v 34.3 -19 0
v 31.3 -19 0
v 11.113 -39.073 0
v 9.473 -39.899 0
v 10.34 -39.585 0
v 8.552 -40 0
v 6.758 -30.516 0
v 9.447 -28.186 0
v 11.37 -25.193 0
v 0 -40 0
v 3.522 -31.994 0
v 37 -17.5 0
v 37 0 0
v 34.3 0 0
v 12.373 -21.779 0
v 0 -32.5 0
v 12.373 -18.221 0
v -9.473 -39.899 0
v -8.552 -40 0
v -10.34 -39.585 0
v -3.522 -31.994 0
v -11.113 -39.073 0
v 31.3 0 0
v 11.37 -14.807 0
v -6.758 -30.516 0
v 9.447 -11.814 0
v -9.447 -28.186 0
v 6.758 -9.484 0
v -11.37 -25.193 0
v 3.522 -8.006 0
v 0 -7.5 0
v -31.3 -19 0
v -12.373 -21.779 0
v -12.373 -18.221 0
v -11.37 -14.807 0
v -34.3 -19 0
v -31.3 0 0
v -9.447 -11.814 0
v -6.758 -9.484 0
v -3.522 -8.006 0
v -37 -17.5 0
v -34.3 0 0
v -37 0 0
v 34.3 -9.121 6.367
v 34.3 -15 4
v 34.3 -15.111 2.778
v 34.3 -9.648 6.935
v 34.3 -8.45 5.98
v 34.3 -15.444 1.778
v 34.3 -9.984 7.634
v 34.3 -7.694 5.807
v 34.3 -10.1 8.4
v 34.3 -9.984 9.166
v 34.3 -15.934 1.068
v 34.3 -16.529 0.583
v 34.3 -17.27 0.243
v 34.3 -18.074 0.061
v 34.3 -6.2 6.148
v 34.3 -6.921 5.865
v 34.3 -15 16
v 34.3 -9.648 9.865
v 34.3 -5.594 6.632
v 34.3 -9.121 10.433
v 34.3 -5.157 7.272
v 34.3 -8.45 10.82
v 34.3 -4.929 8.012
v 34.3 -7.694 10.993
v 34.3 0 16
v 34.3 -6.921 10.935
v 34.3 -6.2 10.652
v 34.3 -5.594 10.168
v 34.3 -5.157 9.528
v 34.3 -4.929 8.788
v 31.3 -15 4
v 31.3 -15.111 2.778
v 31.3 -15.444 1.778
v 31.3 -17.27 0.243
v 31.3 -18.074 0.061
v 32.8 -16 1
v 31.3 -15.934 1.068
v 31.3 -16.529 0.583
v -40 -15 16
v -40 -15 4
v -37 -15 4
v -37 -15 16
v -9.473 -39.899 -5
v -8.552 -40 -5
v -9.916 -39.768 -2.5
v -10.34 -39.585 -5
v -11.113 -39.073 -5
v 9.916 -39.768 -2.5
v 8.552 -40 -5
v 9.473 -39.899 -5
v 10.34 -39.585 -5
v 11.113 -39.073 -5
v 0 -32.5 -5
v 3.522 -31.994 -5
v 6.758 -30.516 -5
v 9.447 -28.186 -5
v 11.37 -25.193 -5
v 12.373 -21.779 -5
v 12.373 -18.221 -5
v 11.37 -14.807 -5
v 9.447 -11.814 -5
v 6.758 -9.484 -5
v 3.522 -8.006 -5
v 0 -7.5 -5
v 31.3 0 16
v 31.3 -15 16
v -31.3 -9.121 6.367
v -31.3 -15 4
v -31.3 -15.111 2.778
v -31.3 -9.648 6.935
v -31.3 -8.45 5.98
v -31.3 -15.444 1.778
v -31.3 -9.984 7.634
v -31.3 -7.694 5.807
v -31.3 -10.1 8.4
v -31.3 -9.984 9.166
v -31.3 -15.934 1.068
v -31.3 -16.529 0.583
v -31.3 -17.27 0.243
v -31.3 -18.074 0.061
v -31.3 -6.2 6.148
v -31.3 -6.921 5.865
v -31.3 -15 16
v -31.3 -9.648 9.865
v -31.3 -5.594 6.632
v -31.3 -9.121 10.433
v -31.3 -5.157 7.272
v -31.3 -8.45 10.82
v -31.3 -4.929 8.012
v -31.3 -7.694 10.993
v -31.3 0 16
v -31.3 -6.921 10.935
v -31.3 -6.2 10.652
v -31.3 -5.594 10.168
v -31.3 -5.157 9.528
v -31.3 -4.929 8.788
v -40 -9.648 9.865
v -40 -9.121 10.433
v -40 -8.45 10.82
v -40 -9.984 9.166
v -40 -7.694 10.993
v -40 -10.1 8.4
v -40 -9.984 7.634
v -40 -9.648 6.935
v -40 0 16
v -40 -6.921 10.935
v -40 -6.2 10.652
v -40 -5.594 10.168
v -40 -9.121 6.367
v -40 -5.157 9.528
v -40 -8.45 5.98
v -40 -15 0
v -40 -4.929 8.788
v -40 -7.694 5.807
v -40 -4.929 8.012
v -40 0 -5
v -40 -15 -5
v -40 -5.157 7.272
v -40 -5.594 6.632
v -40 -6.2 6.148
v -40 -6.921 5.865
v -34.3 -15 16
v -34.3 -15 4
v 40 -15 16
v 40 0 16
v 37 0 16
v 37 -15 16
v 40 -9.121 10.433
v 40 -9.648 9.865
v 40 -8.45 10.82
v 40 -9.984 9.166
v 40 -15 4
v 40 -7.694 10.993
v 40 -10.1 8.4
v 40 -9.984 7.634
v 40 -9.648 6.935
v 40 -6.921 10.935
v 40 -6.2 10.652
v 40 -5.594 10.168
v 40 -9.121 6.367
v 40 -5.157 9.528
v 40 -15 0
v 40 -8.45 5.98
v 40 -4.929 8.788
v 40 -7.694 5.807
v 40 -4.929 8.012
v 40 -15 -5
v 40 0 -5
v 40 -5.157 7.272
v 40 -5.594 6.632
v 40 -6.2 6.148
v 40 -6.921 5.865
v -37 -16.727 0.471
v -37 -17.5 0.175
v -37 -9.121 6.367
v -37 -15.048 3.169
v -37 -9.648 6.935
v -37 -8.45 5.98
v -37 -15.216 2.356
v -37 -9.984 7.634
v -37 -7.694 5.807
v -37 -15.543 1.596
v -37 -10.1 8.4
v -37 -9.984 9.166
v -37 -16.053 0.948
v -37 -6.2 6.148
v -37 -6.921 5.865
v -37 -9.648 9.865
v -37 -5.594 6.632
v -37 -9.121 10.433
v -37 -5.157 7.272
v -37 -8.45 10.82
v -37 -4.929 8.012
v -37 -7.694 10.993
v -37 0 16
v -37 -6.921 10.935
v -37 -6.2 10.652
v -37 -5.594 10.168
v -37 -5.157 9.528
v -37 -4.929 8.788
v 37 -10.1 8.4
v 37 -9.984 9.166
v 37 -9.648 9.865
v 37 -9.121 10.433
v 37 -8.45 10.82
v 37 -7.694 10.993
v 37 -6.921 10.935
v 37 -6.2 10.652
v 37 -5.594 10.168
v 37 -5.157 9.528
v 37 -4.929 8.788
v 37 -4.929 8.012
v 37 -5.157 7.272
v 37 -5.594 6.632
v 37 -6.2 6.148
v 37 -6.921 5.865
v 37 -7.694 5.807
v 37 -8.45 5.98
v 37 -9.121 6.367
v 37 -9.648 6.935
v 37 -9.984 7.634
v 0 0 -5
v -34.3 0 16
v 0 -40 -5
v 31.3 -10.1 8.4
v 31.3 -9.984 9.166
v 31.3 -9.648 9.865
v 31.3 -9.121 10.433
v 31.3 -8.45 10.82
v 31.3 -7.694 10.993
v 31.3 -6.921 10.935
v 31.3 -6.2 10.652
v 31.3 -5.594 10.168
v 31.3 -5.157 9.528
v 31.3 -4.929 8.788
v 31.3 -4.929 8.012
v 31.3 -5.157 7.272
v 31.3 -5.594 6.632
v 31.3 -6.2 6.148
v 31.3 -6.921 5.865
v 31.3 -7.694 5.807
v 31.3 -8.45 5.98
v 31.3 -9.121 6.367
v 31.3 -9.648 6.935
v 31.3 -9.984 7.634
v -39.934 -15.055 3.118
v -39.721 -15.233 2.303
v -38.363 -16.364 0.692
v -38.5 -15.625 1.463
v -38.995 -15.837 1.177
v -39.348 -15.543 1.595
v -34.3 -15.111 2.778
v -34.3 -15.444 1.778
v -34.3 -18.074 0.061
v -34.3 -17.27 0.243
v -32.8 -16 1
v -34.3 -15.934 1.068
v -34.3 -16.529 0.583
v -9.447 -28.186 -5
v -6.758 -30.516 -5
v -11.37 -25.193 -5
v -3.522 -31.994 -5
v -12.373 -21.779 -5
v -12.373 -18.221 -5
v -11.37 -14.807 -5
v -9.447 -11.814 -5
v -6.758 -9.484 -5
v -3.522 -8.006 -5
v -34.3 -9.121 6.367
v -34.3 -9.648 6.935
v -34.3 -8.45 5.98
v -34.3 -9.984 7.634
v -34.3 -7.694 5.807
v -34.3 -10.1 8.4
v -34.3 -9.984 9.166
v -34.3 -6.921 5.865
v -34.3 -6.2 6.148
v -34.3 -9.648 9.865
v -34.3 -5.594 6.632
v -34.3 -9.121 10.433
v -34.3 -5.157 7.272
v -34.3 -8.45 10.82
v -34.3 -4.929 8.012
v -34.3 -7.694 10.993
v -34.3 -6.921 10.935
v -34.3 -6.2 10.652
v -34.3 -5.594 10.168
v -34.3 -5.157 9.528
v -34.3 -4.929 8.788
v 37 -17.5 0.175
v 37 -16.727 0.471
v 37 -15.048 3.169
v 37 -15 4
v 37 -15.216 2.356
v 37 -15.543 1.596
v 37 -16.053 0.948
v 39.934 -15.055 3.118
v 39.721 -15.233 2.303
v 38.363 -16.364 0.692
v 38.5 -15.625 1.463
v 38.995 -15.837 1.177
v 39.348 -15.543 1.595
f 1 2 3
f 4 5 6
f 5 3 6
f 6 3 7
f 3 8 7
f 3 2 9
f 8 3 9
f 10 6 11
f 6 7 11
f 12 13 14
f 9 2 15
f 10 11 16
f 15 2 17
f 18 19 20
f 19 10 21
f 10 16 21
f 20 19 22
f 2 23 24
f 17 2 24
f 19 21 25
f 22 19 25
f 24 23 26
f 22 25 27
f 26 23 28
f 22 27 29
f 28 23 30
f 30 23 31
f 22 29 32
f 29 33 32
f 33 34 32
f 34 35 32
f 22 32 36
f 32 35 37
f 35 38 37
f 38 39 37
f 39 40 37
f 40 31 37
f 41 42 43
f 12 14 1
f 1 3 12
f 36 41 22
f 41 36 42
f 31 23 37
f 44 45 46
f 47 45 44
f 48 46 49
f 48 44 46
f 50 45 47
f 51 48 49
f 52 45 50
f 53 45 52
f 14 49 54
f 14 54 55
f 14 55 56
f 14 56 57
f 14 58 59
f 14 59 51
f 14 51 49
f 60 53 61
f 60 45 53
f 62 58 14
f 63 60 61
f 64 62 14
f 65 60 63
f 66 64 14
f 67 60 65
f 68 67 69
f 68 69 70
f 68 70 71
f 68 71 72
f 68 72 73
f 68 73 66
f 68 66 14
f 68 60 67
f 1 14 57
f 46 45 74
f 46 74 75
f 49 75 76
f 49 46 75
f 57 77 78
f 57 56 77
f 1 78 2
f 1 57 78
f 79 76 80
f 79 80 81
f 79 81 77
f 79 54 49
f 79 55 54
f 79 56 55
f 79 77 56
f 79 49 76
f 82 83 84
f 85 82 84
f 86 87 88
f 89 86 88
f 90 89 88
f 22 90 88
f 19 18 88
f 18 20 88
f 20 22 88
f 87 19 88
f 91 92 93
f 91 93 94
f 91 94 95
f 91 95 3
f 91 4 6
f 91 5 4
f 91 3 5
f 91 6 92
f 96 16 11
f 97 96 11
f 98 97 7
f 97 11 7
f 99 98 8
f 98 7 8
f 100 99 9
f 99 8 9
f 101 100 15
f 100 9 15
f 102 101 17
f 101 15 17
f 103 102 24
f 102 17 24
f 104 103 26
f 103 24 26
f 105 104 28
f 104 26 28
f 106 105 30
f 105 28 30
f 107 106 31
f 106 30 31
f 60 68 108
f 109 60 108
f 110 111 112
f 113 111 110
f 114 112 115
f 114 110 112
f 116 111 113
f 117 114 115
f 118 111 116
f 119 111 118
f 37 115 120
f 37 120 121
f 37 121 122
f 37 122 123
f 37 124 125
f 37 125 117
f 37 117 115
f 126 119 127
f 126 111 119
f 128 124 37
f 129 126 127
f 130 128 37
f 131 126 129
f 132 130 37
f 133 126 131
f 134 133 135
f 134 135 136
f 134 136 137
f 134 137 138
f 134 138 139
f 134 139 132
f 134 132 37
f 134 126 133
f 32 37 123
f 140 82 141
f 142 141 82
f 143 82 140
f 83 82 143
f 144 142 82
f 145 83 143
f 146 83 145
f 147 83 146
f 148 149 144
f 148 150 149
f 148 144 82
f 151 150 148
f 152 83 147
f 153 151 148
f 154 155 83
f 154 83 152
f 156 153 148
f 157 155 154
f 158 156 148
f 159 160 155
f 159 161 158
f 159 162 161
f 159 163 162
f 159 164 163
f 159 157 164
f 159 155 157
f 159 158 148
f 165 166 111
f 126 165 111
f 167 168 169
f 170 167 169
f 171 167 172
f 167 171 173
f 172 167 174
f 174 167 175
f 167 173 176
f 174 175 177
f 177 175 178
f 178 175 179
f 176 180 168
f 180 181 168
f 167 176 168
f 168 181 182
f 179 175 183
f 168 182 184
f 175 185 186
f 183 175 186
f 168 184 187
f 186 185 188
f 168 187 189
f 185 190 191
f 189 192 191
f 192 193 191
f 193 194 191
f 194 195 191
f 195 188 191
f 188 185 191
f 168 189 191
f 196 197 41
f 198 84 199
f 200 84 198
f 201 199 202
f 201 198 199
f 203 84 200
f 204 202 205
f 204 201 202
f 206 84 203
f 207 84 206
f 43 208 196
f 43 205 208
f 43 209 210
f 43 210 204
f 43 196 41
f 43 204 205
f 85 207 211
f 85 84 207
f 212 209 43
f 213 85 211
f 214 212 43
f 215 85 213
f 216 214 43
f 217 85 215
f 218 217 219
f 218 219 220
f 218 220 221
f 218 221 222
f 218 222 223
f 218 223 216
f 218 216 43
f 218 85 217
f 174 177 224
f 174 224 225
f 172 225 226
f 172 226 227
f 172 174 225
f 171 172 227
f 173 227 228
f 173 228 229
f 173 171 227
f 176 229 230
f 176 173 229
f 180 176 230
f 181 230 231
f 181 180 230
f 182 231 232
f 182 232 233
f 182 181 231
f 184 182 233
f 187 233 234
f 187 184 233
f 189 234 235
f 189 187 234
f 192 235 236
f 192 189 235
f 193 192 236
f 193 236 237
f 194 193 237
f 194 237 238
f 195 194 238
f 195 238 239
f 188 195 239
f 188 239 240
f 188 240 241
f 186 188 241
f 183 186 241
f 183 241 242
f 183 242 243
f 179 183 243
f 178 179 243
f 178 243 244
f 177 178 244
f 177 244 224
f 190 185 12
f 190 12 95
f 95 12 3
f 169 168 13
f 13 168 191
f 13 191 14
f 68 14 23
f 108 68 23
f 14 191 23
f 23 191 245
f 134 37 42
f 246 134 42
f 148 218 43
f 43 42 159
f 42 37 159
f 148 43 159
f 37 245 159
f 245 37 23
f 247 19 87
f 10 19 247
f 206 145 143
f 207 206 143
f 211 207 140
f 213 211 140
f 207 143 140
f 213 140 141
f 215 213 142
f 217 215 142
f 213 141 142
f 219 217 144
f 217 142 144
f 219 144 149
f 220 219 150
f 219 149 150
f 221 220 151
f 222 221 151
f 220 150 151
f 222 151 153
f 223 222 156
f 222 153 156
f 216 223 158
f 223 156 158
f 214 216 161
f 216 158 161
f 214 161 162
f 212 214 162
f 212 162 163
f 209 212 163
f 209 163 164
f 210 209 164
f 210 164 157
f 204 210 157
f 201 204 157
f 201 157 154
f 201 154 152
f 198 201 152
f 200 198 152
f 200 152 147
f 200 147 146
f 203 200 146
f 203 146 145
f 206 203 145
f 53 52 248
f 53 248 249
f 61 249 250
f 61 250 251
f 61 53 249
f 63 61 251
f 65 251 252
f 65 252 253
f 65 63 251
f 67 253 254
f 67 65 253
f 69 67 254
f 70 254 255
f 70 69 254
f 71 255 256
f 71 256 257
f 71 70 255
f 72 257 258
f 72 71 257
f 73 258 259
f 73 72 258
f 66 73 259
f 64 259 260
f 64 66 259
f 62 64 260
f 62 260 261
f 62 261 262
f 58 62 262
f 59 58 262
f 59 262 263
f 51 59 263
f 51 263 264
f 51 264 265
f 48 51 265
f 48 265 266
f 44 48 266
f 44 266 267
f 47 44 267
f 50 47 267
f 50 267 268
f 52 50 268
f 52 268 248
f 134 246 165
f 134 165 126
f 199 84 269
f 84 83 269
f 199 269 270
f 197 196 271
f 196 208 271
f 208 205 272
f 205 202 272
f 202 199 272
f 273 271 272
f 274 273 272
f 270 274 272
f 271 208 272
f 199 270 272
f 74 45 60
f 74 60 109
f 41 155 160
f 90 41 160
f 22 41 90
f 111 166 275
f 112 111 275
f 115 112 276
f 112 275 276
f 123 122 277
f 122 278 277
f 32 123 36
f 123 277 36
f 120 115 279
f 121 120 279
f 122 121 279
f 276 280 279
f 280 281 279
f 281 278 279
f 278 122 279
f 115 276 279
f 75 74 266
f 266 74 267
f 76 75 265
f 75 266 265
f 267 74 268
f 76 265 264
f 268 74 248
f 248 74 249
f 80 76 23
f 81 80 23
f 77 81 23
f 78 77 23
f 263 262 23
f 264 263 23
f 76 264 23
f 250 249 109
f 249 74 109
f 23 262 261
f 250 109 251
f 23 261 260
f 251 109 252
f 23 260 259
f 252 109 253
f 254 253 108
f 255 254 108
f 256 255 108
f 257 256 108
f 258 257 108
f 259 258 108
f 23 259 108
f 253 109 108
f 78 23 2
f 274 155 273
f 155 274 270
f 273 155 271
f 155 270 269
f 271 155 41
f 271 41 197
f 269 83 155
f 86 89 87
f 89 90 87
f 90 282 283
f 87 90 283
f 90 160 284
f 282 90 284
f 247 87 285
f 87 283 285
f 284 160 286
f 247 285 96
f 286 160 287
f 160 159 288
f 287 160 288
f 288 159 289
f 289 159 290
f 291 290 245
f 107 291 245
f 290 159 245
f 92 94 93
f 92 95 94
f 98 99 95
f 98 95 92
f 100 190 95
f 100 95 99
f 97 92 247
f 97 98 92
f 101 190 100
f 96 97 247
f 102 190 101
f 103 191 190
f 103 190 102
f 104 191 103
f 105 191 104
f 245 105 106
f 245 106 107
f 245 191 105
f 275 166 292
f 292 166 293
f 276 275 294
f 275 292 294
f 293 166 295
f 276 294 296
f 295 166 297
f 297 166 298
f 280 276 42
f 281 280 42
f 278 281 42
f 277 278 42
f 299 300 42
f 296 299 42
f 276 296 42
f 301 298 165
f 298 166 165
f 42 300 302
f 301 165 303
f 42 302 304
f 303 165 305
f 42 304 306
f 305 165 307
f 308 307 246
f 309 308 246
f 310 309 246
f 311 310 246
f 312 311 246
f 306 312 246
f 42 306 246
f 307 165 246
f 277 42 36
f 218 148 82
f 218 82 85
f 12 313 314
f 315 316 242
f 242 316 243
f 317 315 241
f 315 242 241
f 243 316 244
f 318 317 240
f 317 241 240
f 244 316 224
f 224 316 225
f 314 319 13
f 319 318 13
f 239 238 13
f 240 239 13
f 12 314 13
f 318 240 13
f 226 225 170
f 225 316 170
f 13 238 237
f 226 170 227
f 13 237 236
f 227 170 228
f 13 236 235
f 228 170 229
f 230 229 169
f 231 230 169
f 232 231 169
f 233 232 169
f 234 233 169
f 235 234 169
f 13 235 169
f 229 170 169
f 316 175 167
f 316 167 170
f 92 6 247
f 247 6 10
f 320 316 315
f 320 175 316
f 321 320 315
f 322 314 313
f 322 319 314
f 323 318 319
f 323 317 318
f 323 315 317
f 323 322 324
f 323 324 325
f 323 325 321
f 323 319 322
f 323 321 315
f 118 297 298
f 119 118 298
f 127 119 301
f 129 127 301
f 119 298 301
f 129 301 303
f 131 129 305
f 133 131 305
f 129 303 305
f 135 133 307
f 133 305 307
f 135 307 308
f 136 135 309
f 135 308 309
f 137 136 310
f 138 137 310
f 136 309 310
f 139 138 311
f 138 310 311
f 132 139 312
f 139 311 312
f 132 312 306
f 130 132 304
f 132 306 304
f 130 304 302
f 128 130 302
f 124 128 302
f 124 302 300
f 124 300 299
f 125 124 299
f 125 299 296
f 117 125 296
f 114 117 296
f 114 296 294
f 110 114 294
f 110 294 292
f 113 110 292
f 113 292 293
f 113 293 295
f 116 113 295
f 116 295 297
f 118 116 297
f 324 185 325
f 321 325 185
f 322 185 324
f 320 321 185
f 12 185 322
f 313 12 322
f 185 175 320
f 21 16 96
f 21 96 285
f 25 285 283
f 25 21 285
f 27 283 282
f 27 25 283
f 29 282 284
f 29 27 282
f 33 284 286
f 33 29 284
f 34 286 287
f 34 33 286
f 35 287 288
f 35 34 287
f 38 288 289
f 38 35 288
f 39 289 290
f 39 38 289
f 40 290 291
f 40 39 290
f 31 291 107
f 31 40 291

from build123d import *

# Parameters (mm, degrees)
F0_W         = 3
F0_H         = 15
F1_DEPTH     = 5
F2_DEPTH     = 16
F3_T1_DEPTH  = 3
F3_T6_DEPTH  = 23
F3_T12_DEPTH = 13
F3_T17_DEPTH = 23
F3_T20_DEPTH = 12.2409987036
F4_R         = 2.6
F5_DEPTH     = 40.0010001


# Not quite as in the source:
# - a fillet or chamfer that OpenCascade refuses, or shapes differently, is made with other operations: its cross-section is extruded or revolved along the edge and cut away or added


with BuildPart() as f1:
    # F0 (on Top) → F1 (new body)
    with BuildSketch(Plane.XY):
        with BuildLine():
            Line((-34.3, 0), (-37, 0))
            Line((-37, 0), (-37, -15))
            Line((-37, -15), (-40, -15))
            Line((-40, -15), (-10, -40))
            Line((-10, -40), (0, -40))
            Line((0, -40), (0, -32.5))
            ThreePointArc((0, -32.5), (-12.5, -20), (0, -7.5))
            Line((0, -7.5), (0, 0))
            Line((0, 0), (-31.3, 0))
            Line((-31.3, 0), (-31.3, -15))
            Line((-31.3, -15), (-34.3, -15))
            Line((-34.3, -15), (-34.3, 0))
        make_face()
        with Locations((-32.8, -7.5)):
            Rectangle(F0_W, F0_H)
        with Locations((-38.5, -7.5)):
            Rectangle(F0_W, F0_H)
    extrude(amount=-F1_DEPTH)

    # F0 (on Top) → F2 (join)
    with BuildSketch(Plane.XY):
        with Locations((-32.8, -7.5)):
            Rectangle(F0_W, F0_H)
        with Locations((-38.5, -7.5)):
            Rectangle(F0_W, F0_H)
    extrude(amount=F2_DEPTH)

    # F3: fillet of radius 4 on 3 edges, made by hand

    # F3_s2 → F3_t1 (join)
    with BuildSketch(Plane.YZ.offset(-34.3)):
        with BuildLine():
            add(Edge.make_bspline(
                [(-15, 4), (-15, 0), (-19, 0)],
                knots=[0, 0, 0, 1, 1, 1], degree=2, weights=[1, 1, 1]))
            Line((-19, 0), (-15, 0))
            Line((-15, 0), (-15, 4))
        make_face()
    extrude(amount=F3_T1_DEPTH)


with BuildPart() as f3_tool4:
    # F3_s5 → F3_t6 (new body)
    with BuildSketch(Plane.YZ.offset(-44.3)):
        with BuildLine():
            add(Edge.make_bspline(
                [(-15, 4), (-15, 0), (-19, 0)],
                knots=[0, 0, 0, 1, 1, 1], degree=2, weights=[1, 1, 1]))
            Line((-19, 0), (-15, 0))
            Line((-15, 0), (-15, 4))
        make_face()
    extrude(amount=F3_T6_DEPTH)

    split(bisect_by=Plane(origin=(-23.7704918033, -28.5245901639, 0), x_dir=(0, 0, 1), z_dir=(0.6401843997, 0.7682212796, 0)), keep=Keep.TOP)

    split(bisect_by=Plane.YZ.offset(-37), keep=Keep.BOTTOM)


with BuildPart() as f1_1:
    add(f1.part)

    # F3_t3: union F3_tool4
    add(f3_tool4.part)


with BuildPart() as f3_tool10:
    # F3_s11 → F3_t12 (new body)
    with BuildSketch(Plane.YZ.offset(-50)):
        with BuildLine():
            add(Edge.make_bspline(
                [(-15, 4), (-15, 0), (-19, 0)],
                knots=[0, 0, 0, 1, 1, 1], degree=2, weights=[1, 1, 1]))
            Line((-19, 0), (-15, 0))
            Line((-15, 0), (-15, 4))
        make_face()
    extrude(amount=F3_T12_DEPTH)

    split(bisect_by=Plane(origin=(-23.7704918033, -28.5245901639, 0), x_dir=(0, 0, 1), z_dir=(0.6401843997, 0.7682212796, 0)), keep=Keep.TOP)


with BuildPart() as f1_2:
    add(f1_1.part)

    # F3_t9: union F3_tool10
    add(f3_tool10.part)


with BuildPart() as f3_tool15:
    # F3_s16 → F3_t17 (new body)
    with BuildSketch(Plane.YZ.offset(-50)):
        with BuildLine():
            add(Edge.make_bspline(
                [(-15, 4), (-15, 0), (-19, 0)],
                knots=[0, 0, 0, 1, 1, 1], degree=2, weights=[1, 1, 1]))
            Line((-19, 0), (-15, 0))
            Line((-15, 0), (-15, 4))
        make_face()
    extrude(amount=F3_T17_DEPTH)

    split(bisect_by=Plane.YZ.offset(-31.3), keep=Keep.BOTTOM)

    split(bisect_by=Plane.YZ.offset(-34.3), keep=Keep.TOP)


with BuildPart() as f1_3:
    add(f1_2.part)

    # F3_t14: union F3_tool15
    add(f3_tool15.part)

    # F3_s21 → F3_t20 (cut)
    with BuildSketch(Plane.XY.offset(-8.6204993518)):
        with BuildLine():
            add(Edge.make_bspline(
                [(-11.1125378579, -39.0728851184), (-10, -40), (-8.5518002593, -40)],
                knots=[0, 0, 0, 1, 1, 1], degree=2, weights=[1, 1, 1]))
            Line((-8.5518002593, -40), (-10, -40))
            Line((-10, -40), (-11.1125378579, -39.0728851184))
        make_face()
    extrude(amount=F3_T20_DEPTH, mode=Mode.SUBTRACT)

    # F4 (on face) → F5 (cut, through all)
    with BuildSketch(Plane(origin=(-40, 0, 0), x_dir=(0, -1, 0), z_dir=(-1, 0, 0))):
        with Locations((7.5, 8.4)):
            Circle(F4_R)
    extrude(amount=-F5_DEPTH, mode=Mode.SUBTRACT)

    # F6: F1 across plane


with BuildPart() as f1_4:
    add(f1_3.part)
    add(f1_3.part.mirror(Plane.YZ))


solid = f1_4.part
